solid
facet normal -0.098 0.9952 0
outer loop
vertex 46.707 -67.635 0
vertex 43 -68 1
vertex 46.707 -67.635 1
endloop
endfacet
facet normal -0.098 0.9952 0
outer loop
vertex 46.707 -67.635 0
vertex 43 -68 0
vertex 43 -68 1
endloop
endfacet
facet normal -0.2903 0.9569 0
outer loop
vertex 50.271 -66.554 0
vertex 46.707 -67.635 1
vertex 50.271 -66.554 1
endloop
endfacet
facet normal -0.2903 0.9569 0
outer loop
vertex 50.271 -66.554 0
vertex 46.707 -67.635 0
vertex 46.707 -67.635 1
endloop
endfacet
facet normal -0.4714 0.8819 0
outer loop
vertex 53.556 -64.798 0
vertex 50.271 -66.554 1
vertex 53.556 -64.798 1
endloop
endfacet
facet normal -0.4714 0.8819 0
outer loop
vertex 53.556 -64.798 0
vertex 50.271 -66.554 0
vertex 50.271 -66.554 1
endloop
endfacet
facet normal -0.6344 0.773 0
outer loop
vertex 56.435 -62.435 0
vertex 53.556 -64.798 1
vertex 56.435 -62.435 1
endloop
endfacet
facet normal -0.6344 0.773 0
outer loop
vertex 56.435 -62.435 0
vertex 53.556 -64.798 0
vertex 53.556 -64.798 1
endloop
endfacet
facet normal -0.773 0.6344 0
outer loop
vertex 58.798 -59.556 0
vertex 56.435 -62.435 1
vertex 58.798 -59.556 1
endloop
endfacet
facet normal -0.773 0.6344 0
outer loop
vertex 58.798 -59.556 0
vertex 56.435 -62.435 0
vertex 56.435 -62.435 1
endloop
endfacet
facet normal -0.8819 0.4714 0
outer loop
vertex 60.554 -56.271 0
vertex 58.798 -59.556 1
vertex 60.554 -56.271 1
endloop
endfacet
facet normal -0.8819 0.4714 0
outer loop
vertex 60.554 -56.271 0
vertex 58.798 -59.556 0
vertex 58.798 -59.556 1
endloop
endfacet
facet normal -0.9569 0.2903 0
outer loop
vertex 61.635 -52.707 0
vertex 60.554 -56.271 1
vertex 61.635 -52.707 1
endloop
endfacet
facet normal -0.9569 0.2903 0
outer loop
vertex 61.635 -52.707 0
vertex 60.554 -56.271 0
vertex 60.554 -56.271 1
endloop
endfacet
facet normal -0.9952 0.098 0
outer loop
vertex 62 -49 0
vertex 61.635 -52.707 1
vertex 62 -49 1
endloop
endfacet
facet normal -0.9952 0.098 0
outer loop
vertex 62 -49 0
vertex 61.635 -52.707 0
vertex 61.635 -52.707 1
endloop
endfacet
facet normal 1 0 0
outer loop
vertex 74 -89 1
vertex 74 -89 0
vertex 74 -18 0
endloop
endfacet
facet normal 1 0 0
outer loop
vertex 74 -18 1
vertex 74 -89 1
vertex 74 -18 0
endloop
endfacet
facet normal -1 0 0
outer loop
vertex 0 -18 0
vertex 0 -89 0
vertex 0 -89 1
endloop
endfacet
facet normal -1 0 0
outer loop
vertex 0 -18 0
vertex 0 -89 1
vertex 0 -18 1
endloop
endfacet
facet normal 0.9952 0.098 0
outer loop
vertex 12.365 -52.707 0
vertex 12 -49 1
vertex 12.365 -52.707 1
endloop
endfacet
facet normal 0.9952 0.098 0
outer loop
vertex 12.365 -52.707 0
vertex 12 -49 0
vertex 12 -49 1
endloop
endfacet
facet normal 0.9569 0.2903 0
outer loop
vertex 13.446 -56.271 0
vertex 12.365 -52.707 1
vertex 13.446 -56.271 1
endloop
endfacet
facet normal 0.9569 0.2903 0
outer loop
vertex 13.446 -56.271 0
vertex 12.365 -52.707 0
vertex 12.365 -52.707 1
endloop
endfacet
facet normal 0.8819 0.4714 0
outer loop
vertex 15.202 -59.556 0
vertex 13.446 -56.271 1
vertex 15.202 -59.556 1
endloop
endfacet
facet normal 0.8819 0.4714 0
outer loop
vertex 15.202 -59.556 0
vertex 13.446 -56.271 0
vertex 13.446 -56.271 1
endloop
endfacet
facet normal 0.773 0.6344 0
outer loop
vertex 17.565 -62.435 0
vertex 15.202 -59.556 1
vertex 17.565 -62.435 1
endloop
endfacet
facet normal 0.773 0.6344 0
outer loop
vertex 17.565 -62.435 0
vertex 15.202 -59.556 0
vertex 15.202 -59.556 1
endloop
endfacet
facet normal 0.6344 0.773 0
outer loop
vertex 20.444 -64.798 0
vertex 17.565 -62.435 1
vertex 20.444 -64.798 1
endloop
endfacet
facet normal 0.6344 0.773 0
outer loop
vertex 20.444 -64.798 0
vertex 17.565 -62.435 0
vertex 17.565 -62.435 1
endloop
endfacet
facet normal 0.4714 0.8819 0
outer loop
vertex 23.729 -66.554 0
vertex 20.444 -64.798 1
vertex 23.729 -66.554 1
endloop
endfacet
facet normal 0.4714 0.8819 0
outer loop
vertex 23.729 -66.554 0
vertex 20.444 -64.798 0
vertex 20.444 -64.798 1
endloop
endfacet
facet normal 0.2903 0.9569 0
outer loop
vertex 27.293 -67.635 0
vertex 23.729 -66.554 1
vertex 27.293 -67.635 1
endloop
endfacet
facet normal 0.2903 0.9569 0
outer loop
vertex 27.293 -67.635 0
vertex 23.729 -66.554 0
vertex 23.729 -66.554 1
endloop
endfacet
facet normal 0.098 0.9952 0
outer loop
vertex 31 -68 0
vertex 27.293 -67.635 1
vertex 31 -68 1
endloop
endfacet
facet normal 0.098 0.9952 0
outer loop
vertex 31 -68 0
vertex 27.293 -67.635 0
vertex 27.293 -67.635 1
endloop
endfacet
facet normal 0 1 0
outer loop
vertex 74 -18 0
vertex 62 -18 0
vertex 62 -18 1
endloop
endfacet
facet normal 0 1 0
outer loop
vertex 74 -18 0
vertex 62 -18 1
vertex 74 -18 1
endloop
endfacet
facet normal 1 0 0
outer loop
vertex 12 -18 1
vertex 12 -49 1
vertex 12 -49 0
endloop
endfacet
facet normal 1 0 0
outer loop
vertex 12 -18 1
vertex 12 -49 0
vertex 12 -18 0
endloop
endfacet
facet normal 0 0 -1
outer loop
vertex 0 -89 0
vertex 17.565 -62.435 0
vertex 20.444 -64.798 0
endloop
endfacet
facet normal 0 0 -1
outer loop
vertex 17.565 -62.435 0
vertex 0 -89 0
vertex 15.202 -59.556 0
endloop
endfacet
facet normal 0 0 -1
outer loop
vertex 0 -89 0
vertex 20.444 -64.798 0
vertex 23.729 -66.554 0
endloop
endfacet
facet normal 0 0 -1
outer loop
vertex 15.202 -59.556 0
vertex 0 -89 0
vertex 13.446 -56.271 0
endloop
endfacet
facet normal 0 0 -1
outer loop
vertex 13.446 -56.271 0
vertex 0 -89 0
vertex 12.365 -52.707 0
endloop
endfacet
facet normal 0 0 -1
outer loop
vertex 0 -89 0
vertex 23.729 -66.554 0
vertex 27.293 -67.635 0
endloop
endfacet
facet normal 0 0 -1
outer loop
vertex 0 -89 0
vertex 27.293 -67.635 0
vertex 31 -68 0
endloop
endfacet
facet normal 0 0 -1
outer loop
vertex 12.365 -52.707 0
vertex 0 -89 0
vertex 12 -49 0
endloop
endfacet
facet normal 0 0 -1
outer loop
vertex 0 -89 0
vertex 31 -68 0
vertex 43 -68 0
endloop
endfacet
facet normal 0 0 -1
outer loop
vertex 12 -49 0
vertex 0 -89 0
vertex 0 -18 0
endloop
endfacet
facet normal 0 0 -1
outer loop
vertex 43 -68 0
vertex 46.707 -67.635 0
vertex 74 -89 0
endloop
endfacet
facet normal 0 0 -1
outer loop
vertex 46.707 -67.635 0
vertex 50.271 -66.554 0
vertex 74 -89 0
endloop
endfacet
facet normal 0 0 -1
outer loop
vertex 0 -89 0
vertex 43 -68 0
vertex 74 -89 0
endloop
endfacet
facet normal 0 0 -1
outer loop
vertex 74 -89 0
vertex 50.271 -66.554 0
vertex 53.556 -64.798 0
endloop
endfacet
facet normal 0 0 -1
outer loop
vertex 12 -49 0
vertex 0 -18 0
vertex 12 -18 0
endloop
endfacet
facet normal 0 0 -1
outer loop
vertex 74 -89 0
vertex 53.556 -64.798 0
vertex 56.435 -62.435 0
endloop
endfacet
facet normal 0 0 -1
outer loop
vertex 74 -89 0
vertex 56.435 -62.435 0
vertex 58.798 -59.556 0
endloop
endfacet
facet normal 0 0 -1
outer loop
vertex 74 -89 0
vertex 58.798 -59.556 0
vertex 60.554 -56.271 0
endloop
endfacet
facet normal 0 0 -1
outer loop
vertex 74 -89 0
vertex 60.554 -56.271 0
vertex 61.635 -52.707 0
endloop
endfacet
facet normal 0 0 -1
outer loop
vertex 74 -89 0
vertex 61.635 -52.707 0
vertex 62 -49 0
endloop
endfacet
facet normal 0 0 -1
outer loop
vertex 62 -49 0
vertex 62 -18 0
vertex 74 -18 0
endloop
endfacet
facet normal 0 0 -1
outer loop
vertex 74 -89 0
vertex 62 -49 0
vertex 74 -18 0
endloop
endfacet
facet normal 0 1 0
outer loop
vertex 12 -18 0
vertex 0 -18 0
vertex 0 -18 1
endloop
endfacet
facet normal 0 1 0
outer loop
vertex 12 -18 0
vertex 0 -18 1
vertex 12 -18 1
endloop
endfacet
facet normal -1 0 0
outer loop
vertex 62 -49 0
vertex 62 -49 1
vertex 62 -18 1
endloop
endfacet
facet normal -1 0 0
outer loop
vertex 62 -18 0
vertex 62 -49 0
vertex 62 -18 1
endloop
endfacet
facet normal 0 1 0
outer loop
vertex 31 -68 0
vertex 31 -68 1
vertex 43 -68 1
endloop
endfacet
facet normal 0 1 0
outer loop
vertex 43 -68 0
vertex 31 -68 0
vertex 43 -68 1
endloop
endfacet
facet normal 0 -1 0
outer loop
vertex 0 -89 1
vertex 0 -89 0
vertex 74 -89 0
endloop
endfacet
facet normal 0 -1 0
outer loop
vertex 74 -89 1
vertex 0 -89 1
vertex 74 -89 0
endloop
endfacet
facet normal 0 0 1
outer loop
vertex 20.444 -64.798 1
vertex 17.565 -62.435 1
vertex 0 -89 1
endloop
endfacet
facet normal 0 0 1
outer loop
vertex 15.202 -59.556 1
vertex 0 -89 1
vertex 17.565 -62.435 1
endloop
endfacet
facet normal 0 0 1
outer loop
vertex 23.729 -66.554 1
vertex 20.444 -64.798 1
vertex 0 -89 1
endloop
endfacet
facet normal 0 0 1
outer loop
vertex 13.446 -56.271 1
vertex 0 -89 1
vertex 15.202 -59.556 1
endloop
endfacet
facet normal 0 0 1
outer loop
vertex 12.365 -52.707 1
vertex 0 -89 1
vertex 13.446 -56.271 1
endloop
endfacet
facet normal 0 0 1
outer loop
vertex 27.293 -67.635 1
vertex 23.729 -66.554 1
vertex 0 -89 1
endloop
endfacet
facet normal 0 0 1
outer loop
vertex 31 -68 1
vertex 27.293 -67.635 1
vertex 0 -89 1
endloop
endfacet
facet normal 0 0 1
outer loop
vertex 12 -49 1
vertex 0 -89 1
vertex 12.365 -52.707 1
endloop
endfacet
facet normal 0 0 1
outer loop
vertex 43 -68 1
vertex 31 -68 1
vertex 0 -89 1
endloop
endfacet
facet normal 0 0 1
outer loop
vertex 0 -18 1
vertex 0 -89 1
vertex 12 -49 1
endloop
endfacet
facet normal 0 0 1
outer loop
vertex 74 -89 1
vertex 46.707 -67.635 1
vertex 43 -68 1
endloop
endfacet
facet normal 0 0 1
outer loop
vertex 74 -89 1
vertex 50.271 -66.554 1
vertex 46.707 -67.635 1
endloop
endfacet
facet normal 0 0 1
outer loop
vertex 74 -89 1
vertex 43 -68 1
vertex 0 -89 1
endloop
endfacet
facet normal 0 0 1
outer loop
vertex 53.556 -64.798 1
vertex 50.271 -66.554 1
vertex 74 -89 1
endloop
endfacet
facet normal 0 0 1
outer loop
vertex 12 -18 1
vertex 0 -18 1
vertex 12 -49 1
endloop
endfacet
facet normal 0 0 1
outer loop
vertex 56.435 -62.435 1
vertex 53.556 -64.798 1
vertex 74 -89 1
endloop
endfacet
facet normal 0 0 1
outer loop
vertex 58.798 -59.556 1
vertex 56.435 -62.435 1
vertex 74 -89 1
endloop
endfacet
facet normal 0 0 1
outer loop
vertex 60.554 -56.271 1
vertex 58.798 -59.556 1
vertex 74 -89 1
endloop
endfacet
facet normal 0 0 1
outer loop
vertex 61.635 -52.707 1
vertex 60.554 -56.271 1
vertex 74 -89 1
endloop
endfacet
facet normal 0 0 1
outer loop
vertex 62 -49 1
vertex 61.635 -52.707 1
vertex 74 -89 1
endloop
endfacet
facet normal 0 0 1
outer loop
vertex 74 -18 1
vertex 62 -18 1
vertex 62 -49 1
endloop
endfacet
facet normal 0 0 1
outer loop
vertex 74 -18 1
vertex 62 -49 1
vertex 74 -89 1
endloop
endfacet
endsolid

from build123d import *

# Parameters (mm, degrees)
BOX001_W        = 74
BOX001_H        = 71
BOX001_DEPTH    = 1
SKETCH016_W     = 50
SKETCH016_H     = 50
POCKET009_DEPTH = 1.001
FILLET001_R     = 19


with BuildPart() as part:
    # Box001 → Box001 (new body)
    with BuildSketch(Plane(origin=(2, 0, 1), x_dir=(1, 0, 0), z_dir=(0, 0, 1))):
        with Locations((37, 35.5)):
            Rectangle(BOX001_W, BOX001_H)
    extrude(amount=BOX001_DEPTH)


with BuildPart() as part_1:
    # BaseFeature001 placement: moved
    add(part.part.moved(Location((-2, 0, -1))))

    # Sketch016 (on Face6 of BaseFeature001) → Pocket009 (cut, through all)
    with BuildSketch(Plane.XY.offset(1)):
        with Locations((37, 46)):
            Rectangle(SKETCH016_W, SKETCH016_H)
    extrude(amount=-POCKET009_DEPTH, mode=Mode.SUBTRACT)

    # Fillet001
    fillet001_edges = [part_1.edges().sort_by_distance(p)[0] for p in [
        (12, 21, 0.5),
        (62, 21, 0.5),
    ]]
    fillet(fillet001_edges, radius=FILLET001_R)


with BuildPart() as part_2:
    # Body001 placement: moved
    add(part_1.part.moved(Location((0, -89, 0))))


solid = part_2.part
